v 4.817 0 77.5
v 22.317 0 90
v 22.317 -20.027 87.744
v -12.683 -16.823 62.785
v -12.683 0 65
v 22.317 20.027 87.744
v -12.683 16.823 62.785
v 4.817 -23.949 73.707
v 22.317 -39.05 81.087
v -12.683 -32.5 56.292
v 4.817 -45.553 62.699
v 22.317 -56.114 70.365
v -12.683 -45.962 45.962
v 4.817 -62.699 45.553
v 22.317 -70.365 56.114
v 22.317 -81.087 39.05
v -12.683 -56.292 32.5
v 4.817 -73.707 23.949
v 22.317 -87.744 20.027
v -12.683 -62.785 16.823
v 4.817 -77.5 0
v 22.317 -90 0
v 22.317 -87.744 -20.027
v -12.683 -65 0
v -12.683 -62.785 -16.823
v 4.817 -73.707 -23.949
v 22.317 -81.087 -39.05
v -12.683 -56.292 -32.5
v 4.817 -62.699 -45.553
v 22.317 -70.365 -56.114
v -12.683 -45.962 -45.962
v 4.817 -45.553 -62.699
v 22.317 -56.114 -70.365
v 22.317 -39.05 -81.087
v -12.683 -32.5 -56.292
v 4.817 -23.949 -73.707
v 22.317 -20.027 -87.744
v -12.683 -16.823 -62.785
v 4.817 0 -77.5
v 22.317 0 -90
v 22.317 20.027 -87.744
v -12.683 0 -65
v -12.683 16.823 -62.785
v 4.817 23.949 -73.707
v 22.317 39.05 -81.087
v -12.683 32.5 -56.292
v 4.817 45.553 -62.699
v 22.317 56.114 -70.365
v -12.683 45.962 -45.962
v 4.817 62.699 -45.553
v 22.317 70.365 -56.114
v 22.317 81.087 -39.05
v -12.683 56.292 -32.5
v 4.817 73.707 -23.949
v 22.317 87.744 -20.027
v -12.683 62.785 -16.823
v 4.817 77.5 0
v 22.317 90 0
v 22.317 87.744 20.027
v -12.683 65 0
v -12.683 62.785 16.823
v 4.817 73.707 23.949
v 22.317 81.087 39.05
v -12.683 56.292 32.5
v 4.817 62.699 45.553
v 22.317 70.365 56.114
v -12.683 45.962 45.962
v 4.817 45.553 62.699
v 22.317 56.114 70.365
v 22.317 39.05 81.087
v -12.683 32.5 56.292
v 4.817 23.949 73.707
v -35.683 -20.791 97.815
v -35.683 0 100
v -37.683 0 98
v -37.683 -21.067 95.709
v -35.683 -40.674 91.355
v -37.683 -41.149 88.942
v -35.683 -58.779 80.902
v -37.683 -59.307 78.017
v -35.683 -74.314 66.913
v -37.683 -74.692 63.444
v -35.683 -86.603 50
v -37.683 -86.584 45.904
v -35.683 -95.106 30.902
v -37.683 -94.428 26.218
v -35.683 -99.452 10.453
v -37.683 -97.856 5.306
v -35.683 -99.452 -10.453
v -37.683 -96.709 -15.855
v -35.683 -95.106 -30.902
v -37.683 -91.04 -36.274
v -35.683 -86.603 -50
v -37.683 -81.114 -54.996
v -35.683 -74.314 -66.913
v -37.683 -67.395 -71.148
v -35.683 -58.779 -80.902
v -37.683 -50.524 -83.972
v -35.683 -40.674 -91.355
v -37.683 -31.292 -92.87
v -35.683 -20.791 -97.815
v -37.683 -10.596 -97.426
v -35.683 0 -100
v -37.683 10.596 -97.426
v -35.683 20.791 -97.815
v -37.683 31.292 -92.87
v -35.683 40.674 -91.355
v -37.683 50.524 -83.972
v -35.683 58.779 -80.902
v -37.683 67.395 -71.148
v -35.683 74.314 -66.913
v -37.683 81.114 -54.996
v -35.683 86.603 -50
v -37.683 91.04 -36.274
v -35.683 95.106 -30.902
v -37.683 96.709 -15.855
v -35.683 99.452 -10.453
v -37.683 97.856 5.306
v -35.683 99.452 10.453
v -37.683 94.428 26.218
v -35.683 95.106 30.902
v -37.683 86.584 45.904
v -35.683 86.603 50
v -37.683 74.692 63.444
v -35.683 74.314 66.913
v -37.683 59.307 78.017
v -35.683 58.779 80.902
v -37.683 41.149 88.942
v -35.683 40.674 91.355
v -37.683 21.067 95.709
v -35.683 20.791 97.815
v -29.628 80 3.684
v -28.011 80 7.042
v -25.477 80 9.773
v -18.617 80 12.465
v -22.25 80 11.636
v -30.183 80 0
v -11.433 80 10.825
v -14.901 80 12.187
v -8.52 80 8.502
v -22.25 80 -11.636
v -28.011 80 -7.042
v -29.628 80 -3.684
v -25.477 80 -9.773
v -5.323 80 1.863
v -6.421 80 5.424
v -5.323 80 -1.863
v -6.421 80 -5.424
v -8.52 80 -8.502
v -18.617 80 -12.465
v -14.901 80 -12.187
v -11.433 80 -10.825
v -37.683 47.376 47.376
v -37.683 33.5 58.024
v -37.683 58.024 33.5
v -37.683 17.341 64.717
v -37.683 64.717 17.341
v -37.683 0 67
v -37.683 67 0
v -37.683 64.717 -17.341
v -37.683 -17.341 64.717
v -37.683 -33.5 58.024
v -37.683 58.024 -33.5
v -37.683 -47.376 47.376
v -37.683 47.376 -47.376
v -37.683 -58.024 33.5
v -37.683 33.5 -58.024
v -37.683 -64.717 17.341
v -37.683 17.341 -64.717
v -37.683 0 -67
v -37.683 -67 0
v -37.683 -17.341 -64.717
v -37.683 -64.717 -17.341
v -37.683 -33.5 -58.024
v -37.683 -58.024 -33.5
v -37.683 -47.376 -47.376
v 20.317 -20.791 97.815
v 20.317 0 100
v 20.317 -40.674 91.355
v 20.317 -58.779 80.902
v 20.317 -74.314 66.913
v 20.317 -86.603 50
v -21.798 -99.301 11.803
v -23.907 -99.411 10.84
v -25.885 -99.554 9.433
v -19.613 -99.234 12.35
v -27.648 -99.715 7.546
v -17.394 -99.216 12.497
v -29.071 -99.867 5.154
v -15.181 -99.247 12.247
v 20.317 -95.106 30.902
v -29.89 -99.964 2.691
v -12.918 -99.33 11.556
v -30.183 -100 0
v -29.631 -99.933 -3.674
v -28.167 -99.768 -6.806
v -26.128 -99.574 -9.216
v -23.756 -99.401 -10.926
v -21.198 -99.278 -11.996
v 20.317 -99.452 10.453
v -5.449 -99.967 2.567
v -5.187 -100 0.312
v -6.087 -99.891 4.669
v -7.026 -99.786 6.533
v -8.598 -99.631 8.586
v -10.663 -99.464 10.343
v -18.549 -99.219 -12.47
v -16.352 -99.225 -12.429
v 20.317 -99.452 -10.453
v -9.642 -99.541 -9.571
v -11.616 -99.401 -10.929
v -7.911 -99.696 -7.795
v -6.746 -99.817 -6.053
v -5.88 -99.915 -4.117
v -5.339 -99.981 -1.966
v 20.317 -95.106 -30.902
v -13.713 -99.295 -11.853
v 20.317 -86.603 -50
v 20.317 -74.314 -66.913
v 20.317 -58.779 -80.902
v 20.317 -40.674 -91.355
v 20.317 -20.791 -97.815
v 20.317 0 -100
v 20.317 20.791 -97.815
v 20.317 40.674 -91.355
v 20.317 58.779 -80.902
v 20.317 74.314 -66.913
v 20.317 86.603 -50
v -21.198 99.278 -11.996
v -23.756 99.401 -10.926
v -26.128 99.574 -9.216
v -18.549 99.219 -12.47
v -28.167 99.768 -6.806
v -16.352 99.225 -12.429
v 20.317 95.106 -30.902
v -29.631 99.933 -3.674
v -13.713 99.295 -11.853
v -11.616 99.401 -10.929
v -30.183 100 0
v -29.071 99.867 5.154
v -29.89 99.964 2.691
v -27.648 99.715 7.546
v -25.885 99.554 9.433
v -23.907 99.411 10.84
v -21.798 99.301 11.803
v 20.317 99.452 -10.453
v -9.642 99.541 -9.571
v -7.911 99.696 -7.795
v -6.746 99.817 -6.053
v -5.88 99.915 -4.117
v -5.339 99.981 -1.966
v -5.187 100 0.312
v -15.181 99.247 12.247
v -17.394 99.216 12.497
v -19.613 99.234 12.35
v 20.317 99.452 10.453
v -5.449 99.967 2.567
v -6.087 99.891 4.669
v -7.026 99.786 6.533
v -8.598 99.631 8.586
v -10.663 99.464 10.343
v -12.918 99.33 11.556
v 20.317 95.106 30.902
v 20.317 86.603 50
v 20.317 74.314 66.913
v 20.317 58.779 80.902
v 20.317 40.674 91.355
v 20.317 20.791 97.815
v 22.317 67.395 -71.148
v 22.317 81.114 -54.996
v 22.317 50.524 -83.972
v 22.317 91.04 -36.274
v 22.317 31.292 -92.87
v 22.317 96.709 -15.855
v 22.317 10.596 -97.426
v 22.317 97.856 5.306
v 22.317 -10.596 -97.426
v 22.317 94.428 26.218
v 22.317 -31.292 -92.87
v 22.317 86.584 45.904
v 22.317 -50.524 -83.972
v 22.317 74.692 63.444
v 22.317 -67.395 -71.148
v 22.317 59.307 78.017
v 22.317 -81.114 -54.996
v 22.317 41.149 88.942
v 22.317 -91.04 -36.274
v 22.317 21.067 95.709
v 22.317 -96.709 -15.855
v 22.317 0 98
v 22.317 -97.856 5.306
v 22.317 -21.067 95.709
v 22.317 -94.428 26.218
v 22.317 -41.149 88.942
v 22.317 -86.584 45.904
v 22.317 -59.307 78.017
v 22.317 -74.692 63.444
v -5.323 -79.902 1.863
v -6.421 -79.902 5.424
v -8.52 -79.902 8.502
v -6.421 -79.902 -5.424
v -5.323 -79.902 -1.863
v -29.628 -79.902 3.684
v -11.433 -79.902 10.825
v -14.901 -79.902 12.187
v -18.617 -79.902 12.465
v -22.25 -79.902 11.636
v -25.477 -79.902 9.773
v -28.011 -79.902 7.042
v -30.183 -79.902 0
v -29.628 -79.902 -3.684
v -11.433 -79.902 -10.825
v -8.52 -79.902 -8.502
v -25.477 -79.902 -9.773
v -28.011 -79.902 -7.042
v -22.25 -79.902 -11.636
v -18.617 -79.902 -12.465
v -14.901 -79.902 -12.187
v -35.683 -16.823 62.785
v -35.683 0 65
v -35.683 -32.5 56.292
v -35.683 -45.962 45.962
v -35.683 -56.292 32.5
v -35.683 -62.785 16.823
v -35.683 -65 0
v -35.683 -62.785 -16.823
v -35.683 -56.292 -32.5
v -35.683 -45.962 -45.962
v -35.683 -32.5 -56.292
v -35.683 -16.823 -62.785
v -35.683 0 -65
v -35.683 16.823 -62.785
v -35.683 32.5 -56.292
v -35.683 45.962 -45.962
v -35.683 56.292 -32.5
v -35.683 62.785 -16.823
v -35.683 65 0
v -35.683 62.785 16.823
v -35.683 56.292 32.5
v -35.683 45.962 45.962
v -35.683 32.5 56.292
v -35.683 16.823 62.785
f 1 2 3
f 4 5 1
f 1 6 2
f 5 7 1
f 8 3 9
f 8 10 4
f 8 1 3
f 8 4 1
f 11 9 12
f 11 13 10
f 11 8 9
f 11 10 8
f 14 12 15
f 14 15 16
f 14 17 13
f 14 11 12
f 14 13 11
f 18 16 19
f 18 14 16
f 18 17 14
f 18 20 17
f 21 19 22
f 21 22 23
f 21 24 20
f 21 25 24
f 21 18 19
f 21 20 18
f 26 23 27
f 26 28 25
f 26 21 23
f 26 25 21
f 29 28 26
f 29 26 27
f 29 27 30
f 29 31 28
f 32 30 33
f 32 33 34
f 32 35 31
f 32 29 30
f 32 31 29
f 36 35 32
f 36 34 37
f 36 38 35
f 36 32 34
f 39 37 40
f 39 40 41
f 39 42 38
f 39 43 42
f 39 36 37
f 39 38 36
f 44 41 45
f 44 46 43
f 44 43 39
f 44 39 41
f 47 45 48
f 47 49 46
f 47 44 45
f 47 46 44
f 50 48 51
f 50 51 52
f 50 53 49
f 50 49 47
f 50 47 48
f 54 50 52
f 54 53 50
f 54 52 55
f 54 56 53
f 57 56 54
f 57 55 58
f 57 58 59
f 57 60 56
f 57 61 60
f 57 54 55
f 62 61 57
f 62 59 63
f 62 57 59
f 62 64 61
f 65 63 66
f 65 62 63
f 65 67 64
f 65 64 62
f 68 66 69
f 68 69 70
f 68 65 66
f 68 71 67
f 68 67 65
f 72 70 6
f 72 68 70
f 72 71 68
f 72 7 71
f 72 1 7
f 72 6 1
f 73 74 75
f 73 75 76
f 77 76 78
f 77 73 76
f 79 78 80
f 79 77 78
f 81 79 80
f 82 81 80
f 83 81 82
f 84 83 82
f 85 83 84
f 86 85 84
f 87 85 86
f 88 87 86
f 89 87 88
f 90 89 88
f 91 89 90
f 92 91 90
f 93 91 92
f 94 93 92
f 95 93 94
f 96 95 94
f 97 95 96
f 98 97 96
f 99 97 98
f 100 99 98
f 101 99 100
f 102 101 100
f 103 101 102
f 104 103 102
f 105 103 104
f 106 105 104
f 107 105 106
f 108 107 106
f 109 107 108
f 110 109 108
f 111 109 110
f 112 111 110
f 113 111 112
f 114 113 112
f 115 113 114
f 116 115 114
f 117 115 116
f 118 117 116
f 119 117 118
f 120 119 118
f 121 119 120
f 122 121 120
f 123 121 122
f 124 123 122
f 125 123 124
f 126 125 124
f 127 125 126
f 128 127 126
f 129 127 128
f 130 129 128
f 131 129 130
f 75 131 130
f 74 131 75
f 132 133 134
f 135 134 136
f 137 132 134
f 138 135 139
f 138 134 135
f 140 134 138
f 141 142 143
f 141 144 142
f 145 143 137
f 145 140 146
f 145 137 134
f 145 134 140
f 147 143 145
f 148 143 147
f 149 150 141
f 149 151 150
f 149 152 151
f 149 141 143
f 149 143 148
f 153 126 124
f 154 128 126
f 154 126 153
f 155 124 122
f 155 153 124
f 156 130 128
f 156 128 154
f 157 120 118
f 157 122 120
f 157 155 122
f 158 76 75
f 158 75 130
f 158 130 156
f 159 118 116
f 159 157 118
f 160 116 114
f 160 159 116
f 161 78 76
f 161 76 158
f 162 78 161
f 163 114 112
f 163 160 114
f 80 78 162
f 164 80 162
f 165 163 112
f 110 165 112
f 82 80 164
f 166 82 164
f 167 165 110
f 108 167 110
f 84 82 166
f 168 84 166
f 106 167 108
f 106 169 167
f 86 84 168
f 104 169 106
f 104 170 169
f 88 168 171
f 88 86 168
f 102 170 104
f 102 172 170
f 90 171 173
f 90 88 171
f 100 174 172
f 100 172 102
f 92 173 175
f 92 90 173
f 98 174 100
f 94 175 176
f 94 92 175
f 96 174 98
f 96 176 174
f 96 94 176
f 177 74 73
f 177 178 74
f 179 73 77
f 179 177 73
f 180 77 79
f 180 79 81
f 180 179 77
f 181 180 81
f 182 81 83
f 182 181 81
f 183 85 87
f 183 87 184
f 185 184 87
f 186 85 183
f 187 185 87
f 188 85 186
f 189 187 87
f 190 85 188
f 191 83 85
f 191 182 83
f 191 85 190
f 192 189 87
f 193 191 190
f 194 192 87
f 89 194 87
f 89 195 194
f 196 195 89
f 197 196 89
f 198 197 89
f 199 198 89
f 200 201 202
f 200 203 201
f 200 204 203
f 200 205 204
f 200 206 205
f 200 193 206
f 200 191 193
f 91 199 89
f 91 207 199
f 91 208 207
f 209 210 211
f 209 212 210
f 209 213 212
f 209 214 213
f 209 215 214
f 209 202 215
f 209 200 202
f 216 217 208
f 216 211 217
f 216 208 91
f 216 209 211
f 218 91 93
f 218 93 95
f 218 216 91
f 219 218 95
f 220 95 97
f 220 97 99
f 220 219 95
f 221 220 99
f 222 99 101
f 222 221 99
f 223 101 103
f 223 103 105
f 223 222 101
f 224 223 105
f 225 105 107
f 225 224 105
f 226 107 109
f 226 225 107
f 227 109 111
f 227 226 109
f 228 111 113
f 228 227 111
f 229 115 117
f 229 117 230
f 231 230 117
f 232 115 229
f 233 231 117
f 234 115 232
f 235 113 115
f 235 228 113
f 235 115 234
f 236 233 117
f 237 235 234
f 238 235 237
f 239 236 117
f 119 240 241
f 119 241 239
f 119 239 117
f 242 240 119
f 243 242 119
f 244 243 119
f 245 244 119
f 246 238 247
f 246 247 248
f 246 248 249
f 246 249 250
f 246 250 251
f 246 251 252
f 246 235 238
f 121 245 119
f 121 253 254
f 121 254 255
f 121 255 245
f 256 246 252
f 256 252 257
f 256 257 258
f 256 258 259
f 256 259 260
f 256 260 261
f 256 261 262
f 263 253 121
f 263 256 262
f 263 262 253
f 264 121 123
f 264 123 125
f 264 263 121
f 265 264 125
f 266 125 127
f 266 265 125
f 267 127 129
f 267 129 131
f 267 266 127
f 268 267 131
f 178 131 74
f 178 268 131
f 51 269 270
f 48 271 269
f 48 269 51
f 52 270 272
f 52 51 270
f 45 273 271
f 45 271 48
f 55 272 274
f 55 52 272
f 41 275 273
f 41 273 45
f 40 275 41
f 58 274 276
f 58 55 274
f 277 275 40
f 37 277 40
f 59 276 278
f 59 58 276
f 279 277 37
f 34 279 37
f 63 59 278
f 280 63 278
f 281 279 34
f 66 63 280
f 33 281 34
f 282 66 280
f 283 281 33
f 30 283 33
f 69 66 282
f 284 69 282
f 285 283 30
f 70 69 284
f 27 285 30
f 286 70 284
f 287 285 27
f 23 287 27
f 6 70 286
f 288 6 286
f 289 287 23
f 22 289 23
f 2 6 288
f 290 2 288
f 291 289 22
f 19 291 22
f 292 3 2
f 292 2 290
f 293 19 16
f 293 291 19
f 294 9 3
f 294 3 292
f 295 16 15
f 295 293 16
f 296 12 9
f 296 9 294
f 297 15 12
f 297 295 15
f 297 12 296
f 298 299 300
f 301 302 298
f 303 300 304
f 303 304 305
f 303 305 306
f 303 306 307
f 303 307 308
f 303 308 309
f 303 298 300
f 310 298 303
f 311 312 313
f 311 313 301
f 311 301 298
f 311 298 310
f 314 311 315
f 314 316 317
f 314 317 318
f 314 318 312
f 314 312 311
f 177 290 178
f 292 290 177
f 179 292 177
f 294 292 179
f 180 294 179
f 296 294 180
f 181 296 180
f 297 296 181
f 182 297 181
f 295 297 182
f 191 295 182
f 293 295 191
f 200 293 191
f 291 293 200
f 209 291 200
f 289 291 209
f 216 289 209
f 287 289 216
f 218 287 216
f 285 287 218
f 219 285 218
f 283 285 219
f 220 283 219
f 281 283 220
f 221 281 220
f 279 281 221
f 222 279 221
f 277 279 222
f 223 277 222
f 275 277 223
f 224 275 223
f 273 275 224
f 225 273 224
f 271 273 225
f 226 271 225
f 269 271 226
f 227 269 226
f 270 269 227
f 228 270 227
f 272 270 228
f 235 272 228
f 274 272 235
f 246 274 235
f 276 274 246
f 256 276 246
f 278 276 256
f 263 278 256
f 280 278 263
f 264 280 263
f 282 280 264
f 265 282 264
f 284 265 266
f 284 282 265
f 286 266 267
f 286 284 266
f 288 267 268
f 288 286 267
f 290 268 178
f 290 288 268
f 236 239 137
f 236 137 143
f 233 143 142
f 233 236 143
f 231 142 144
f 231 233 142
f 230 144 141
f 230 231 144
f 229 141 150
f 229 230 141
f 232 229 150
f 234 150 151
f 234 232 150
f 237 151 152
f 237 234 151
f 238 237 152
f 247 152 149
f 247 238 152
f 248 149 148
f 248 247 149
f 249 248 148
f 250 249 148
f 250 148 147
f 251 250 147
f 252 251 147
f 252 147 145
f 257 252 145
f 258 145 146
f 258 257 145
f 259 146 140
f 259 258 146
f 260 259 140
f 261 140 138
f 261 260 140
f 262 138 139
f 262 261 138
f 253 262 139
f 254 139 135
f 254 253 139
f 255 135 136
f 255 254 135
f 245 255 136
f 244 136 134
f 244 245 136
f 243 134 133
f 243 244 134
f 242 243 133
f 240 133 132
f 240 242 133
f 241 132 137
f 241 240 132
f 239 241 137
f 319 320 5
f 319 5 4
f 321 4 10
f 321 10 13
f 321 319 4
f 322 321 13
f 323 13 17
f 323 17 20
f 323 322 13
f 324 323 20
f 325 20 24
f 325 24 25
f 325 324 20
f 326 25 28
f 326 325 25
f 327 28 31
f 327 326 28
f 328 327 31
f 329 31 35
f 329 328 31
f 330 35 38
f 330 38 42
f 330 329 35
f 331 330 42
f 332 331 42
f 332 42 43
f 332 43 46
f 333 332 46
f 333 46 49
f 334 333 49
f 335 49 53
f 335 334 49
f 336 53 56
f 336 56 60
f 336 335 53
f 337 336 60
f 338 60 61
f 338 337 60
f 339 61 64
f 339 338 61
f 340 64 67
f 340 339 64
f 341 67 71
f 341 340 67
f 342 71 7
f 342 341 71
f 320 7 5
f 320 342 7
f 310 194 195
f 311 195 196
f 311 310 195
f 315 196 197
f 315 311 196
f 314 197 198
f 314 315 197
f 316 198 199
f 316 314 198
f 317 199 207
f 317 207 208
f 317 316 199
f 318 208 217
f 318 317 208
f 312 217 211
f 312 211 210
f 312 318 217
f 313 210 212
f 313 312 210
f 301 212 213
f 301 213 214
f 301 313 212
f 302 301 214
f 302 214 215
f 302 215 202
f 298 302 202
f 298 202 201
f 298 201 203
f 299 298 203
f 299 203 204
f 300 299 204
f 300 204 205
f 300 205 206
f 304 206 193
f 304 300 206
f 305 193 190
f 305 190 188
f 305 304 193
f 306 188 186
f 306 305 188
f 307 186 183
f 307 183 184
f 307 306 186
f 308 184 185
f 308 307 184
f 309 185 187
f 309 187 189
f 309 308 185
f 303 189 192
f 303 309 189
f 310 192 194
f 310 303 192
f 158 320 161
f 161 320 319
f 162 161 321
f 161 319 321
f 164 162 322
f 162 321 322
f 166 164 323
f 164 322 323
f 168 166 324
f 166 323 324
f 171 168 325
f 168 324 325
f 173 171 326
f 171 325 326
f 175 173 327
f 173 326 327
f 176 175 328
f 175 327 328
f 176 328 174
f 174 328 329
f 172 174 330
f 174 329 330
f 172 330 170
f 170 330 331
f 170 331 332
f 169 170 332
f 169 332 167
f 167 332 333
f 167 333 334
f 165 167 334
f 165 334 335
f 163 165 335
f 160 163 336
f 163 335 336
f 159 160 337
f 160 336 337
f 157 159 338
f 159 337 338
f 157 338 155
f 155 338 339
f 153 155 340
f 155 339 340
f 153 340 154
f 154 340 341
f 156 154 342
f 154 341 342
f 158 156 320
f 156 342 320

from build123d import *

# Parameters (mm, degrees)
CHAMFER_1_SIZE = 2
SKETCH_2_W     = 12.5
SKETCH_2_H     = 20


with BuildPart() as part:
    # Эскиз1 → Повернуть1 (revolve)
    with BuildSketch(Plane.XY, mode=Mode.PRIVATE) as revolve_1_sk:
        Polygon((-37.682926829, -65), (-37.682926829, -100), (22.317073171, -100), (22.317073171, -90), (-12.682926829, -65), align=None)
    revolve(revolve_1_sk.sketch.rotate(Axis((-193.536585366, 0, 0), (1, 0, 0)), 270), axis=Axis((-193.536585366, 0, 0), (1, 0, 0)))

    # Фаска1
    chamfer_1_edges = [part.edges().sort_by_distance(p)[0] for p in [
        (22.317073171, 0, -100),
        (-37.682926829, 0, -100),
        (-37.682926829, 0, -65),
    ]]
    chamfer(chamfer_1_edges, length=CHAMFER_1_SIZE)

    # Эскиз2 → Вырез-Повернуть1 (revolve, cut)
    with BuildSketch(Plane.XY, mode=Mode.PRIVATE) as cut_revolve_1_sk:
        Polygon((-5.182926829, -99.902279859), (-5.182926829, -79.902279859), (-17.682926829, -79.902279859), (-17.682926829, -99.902279859), (-17.682926829, -106.132104806), (-5.182926829, -106.132104806), align=None)
        with Locations((-11.432926829, 90)):
            Rectangle(SKETCH_2_W, SKETCH_2_H)
    revolve(cut_revolve_1_sk.sketch.rotate(Axis((-17.682926829, 126.68088459, 0), (0, -1, 0)), 180), axis=Axis((-17.682926829, 126.68088459, 0), (0, -1, 0)), mode=Mode.SUBTRACT)


solid = part.part
